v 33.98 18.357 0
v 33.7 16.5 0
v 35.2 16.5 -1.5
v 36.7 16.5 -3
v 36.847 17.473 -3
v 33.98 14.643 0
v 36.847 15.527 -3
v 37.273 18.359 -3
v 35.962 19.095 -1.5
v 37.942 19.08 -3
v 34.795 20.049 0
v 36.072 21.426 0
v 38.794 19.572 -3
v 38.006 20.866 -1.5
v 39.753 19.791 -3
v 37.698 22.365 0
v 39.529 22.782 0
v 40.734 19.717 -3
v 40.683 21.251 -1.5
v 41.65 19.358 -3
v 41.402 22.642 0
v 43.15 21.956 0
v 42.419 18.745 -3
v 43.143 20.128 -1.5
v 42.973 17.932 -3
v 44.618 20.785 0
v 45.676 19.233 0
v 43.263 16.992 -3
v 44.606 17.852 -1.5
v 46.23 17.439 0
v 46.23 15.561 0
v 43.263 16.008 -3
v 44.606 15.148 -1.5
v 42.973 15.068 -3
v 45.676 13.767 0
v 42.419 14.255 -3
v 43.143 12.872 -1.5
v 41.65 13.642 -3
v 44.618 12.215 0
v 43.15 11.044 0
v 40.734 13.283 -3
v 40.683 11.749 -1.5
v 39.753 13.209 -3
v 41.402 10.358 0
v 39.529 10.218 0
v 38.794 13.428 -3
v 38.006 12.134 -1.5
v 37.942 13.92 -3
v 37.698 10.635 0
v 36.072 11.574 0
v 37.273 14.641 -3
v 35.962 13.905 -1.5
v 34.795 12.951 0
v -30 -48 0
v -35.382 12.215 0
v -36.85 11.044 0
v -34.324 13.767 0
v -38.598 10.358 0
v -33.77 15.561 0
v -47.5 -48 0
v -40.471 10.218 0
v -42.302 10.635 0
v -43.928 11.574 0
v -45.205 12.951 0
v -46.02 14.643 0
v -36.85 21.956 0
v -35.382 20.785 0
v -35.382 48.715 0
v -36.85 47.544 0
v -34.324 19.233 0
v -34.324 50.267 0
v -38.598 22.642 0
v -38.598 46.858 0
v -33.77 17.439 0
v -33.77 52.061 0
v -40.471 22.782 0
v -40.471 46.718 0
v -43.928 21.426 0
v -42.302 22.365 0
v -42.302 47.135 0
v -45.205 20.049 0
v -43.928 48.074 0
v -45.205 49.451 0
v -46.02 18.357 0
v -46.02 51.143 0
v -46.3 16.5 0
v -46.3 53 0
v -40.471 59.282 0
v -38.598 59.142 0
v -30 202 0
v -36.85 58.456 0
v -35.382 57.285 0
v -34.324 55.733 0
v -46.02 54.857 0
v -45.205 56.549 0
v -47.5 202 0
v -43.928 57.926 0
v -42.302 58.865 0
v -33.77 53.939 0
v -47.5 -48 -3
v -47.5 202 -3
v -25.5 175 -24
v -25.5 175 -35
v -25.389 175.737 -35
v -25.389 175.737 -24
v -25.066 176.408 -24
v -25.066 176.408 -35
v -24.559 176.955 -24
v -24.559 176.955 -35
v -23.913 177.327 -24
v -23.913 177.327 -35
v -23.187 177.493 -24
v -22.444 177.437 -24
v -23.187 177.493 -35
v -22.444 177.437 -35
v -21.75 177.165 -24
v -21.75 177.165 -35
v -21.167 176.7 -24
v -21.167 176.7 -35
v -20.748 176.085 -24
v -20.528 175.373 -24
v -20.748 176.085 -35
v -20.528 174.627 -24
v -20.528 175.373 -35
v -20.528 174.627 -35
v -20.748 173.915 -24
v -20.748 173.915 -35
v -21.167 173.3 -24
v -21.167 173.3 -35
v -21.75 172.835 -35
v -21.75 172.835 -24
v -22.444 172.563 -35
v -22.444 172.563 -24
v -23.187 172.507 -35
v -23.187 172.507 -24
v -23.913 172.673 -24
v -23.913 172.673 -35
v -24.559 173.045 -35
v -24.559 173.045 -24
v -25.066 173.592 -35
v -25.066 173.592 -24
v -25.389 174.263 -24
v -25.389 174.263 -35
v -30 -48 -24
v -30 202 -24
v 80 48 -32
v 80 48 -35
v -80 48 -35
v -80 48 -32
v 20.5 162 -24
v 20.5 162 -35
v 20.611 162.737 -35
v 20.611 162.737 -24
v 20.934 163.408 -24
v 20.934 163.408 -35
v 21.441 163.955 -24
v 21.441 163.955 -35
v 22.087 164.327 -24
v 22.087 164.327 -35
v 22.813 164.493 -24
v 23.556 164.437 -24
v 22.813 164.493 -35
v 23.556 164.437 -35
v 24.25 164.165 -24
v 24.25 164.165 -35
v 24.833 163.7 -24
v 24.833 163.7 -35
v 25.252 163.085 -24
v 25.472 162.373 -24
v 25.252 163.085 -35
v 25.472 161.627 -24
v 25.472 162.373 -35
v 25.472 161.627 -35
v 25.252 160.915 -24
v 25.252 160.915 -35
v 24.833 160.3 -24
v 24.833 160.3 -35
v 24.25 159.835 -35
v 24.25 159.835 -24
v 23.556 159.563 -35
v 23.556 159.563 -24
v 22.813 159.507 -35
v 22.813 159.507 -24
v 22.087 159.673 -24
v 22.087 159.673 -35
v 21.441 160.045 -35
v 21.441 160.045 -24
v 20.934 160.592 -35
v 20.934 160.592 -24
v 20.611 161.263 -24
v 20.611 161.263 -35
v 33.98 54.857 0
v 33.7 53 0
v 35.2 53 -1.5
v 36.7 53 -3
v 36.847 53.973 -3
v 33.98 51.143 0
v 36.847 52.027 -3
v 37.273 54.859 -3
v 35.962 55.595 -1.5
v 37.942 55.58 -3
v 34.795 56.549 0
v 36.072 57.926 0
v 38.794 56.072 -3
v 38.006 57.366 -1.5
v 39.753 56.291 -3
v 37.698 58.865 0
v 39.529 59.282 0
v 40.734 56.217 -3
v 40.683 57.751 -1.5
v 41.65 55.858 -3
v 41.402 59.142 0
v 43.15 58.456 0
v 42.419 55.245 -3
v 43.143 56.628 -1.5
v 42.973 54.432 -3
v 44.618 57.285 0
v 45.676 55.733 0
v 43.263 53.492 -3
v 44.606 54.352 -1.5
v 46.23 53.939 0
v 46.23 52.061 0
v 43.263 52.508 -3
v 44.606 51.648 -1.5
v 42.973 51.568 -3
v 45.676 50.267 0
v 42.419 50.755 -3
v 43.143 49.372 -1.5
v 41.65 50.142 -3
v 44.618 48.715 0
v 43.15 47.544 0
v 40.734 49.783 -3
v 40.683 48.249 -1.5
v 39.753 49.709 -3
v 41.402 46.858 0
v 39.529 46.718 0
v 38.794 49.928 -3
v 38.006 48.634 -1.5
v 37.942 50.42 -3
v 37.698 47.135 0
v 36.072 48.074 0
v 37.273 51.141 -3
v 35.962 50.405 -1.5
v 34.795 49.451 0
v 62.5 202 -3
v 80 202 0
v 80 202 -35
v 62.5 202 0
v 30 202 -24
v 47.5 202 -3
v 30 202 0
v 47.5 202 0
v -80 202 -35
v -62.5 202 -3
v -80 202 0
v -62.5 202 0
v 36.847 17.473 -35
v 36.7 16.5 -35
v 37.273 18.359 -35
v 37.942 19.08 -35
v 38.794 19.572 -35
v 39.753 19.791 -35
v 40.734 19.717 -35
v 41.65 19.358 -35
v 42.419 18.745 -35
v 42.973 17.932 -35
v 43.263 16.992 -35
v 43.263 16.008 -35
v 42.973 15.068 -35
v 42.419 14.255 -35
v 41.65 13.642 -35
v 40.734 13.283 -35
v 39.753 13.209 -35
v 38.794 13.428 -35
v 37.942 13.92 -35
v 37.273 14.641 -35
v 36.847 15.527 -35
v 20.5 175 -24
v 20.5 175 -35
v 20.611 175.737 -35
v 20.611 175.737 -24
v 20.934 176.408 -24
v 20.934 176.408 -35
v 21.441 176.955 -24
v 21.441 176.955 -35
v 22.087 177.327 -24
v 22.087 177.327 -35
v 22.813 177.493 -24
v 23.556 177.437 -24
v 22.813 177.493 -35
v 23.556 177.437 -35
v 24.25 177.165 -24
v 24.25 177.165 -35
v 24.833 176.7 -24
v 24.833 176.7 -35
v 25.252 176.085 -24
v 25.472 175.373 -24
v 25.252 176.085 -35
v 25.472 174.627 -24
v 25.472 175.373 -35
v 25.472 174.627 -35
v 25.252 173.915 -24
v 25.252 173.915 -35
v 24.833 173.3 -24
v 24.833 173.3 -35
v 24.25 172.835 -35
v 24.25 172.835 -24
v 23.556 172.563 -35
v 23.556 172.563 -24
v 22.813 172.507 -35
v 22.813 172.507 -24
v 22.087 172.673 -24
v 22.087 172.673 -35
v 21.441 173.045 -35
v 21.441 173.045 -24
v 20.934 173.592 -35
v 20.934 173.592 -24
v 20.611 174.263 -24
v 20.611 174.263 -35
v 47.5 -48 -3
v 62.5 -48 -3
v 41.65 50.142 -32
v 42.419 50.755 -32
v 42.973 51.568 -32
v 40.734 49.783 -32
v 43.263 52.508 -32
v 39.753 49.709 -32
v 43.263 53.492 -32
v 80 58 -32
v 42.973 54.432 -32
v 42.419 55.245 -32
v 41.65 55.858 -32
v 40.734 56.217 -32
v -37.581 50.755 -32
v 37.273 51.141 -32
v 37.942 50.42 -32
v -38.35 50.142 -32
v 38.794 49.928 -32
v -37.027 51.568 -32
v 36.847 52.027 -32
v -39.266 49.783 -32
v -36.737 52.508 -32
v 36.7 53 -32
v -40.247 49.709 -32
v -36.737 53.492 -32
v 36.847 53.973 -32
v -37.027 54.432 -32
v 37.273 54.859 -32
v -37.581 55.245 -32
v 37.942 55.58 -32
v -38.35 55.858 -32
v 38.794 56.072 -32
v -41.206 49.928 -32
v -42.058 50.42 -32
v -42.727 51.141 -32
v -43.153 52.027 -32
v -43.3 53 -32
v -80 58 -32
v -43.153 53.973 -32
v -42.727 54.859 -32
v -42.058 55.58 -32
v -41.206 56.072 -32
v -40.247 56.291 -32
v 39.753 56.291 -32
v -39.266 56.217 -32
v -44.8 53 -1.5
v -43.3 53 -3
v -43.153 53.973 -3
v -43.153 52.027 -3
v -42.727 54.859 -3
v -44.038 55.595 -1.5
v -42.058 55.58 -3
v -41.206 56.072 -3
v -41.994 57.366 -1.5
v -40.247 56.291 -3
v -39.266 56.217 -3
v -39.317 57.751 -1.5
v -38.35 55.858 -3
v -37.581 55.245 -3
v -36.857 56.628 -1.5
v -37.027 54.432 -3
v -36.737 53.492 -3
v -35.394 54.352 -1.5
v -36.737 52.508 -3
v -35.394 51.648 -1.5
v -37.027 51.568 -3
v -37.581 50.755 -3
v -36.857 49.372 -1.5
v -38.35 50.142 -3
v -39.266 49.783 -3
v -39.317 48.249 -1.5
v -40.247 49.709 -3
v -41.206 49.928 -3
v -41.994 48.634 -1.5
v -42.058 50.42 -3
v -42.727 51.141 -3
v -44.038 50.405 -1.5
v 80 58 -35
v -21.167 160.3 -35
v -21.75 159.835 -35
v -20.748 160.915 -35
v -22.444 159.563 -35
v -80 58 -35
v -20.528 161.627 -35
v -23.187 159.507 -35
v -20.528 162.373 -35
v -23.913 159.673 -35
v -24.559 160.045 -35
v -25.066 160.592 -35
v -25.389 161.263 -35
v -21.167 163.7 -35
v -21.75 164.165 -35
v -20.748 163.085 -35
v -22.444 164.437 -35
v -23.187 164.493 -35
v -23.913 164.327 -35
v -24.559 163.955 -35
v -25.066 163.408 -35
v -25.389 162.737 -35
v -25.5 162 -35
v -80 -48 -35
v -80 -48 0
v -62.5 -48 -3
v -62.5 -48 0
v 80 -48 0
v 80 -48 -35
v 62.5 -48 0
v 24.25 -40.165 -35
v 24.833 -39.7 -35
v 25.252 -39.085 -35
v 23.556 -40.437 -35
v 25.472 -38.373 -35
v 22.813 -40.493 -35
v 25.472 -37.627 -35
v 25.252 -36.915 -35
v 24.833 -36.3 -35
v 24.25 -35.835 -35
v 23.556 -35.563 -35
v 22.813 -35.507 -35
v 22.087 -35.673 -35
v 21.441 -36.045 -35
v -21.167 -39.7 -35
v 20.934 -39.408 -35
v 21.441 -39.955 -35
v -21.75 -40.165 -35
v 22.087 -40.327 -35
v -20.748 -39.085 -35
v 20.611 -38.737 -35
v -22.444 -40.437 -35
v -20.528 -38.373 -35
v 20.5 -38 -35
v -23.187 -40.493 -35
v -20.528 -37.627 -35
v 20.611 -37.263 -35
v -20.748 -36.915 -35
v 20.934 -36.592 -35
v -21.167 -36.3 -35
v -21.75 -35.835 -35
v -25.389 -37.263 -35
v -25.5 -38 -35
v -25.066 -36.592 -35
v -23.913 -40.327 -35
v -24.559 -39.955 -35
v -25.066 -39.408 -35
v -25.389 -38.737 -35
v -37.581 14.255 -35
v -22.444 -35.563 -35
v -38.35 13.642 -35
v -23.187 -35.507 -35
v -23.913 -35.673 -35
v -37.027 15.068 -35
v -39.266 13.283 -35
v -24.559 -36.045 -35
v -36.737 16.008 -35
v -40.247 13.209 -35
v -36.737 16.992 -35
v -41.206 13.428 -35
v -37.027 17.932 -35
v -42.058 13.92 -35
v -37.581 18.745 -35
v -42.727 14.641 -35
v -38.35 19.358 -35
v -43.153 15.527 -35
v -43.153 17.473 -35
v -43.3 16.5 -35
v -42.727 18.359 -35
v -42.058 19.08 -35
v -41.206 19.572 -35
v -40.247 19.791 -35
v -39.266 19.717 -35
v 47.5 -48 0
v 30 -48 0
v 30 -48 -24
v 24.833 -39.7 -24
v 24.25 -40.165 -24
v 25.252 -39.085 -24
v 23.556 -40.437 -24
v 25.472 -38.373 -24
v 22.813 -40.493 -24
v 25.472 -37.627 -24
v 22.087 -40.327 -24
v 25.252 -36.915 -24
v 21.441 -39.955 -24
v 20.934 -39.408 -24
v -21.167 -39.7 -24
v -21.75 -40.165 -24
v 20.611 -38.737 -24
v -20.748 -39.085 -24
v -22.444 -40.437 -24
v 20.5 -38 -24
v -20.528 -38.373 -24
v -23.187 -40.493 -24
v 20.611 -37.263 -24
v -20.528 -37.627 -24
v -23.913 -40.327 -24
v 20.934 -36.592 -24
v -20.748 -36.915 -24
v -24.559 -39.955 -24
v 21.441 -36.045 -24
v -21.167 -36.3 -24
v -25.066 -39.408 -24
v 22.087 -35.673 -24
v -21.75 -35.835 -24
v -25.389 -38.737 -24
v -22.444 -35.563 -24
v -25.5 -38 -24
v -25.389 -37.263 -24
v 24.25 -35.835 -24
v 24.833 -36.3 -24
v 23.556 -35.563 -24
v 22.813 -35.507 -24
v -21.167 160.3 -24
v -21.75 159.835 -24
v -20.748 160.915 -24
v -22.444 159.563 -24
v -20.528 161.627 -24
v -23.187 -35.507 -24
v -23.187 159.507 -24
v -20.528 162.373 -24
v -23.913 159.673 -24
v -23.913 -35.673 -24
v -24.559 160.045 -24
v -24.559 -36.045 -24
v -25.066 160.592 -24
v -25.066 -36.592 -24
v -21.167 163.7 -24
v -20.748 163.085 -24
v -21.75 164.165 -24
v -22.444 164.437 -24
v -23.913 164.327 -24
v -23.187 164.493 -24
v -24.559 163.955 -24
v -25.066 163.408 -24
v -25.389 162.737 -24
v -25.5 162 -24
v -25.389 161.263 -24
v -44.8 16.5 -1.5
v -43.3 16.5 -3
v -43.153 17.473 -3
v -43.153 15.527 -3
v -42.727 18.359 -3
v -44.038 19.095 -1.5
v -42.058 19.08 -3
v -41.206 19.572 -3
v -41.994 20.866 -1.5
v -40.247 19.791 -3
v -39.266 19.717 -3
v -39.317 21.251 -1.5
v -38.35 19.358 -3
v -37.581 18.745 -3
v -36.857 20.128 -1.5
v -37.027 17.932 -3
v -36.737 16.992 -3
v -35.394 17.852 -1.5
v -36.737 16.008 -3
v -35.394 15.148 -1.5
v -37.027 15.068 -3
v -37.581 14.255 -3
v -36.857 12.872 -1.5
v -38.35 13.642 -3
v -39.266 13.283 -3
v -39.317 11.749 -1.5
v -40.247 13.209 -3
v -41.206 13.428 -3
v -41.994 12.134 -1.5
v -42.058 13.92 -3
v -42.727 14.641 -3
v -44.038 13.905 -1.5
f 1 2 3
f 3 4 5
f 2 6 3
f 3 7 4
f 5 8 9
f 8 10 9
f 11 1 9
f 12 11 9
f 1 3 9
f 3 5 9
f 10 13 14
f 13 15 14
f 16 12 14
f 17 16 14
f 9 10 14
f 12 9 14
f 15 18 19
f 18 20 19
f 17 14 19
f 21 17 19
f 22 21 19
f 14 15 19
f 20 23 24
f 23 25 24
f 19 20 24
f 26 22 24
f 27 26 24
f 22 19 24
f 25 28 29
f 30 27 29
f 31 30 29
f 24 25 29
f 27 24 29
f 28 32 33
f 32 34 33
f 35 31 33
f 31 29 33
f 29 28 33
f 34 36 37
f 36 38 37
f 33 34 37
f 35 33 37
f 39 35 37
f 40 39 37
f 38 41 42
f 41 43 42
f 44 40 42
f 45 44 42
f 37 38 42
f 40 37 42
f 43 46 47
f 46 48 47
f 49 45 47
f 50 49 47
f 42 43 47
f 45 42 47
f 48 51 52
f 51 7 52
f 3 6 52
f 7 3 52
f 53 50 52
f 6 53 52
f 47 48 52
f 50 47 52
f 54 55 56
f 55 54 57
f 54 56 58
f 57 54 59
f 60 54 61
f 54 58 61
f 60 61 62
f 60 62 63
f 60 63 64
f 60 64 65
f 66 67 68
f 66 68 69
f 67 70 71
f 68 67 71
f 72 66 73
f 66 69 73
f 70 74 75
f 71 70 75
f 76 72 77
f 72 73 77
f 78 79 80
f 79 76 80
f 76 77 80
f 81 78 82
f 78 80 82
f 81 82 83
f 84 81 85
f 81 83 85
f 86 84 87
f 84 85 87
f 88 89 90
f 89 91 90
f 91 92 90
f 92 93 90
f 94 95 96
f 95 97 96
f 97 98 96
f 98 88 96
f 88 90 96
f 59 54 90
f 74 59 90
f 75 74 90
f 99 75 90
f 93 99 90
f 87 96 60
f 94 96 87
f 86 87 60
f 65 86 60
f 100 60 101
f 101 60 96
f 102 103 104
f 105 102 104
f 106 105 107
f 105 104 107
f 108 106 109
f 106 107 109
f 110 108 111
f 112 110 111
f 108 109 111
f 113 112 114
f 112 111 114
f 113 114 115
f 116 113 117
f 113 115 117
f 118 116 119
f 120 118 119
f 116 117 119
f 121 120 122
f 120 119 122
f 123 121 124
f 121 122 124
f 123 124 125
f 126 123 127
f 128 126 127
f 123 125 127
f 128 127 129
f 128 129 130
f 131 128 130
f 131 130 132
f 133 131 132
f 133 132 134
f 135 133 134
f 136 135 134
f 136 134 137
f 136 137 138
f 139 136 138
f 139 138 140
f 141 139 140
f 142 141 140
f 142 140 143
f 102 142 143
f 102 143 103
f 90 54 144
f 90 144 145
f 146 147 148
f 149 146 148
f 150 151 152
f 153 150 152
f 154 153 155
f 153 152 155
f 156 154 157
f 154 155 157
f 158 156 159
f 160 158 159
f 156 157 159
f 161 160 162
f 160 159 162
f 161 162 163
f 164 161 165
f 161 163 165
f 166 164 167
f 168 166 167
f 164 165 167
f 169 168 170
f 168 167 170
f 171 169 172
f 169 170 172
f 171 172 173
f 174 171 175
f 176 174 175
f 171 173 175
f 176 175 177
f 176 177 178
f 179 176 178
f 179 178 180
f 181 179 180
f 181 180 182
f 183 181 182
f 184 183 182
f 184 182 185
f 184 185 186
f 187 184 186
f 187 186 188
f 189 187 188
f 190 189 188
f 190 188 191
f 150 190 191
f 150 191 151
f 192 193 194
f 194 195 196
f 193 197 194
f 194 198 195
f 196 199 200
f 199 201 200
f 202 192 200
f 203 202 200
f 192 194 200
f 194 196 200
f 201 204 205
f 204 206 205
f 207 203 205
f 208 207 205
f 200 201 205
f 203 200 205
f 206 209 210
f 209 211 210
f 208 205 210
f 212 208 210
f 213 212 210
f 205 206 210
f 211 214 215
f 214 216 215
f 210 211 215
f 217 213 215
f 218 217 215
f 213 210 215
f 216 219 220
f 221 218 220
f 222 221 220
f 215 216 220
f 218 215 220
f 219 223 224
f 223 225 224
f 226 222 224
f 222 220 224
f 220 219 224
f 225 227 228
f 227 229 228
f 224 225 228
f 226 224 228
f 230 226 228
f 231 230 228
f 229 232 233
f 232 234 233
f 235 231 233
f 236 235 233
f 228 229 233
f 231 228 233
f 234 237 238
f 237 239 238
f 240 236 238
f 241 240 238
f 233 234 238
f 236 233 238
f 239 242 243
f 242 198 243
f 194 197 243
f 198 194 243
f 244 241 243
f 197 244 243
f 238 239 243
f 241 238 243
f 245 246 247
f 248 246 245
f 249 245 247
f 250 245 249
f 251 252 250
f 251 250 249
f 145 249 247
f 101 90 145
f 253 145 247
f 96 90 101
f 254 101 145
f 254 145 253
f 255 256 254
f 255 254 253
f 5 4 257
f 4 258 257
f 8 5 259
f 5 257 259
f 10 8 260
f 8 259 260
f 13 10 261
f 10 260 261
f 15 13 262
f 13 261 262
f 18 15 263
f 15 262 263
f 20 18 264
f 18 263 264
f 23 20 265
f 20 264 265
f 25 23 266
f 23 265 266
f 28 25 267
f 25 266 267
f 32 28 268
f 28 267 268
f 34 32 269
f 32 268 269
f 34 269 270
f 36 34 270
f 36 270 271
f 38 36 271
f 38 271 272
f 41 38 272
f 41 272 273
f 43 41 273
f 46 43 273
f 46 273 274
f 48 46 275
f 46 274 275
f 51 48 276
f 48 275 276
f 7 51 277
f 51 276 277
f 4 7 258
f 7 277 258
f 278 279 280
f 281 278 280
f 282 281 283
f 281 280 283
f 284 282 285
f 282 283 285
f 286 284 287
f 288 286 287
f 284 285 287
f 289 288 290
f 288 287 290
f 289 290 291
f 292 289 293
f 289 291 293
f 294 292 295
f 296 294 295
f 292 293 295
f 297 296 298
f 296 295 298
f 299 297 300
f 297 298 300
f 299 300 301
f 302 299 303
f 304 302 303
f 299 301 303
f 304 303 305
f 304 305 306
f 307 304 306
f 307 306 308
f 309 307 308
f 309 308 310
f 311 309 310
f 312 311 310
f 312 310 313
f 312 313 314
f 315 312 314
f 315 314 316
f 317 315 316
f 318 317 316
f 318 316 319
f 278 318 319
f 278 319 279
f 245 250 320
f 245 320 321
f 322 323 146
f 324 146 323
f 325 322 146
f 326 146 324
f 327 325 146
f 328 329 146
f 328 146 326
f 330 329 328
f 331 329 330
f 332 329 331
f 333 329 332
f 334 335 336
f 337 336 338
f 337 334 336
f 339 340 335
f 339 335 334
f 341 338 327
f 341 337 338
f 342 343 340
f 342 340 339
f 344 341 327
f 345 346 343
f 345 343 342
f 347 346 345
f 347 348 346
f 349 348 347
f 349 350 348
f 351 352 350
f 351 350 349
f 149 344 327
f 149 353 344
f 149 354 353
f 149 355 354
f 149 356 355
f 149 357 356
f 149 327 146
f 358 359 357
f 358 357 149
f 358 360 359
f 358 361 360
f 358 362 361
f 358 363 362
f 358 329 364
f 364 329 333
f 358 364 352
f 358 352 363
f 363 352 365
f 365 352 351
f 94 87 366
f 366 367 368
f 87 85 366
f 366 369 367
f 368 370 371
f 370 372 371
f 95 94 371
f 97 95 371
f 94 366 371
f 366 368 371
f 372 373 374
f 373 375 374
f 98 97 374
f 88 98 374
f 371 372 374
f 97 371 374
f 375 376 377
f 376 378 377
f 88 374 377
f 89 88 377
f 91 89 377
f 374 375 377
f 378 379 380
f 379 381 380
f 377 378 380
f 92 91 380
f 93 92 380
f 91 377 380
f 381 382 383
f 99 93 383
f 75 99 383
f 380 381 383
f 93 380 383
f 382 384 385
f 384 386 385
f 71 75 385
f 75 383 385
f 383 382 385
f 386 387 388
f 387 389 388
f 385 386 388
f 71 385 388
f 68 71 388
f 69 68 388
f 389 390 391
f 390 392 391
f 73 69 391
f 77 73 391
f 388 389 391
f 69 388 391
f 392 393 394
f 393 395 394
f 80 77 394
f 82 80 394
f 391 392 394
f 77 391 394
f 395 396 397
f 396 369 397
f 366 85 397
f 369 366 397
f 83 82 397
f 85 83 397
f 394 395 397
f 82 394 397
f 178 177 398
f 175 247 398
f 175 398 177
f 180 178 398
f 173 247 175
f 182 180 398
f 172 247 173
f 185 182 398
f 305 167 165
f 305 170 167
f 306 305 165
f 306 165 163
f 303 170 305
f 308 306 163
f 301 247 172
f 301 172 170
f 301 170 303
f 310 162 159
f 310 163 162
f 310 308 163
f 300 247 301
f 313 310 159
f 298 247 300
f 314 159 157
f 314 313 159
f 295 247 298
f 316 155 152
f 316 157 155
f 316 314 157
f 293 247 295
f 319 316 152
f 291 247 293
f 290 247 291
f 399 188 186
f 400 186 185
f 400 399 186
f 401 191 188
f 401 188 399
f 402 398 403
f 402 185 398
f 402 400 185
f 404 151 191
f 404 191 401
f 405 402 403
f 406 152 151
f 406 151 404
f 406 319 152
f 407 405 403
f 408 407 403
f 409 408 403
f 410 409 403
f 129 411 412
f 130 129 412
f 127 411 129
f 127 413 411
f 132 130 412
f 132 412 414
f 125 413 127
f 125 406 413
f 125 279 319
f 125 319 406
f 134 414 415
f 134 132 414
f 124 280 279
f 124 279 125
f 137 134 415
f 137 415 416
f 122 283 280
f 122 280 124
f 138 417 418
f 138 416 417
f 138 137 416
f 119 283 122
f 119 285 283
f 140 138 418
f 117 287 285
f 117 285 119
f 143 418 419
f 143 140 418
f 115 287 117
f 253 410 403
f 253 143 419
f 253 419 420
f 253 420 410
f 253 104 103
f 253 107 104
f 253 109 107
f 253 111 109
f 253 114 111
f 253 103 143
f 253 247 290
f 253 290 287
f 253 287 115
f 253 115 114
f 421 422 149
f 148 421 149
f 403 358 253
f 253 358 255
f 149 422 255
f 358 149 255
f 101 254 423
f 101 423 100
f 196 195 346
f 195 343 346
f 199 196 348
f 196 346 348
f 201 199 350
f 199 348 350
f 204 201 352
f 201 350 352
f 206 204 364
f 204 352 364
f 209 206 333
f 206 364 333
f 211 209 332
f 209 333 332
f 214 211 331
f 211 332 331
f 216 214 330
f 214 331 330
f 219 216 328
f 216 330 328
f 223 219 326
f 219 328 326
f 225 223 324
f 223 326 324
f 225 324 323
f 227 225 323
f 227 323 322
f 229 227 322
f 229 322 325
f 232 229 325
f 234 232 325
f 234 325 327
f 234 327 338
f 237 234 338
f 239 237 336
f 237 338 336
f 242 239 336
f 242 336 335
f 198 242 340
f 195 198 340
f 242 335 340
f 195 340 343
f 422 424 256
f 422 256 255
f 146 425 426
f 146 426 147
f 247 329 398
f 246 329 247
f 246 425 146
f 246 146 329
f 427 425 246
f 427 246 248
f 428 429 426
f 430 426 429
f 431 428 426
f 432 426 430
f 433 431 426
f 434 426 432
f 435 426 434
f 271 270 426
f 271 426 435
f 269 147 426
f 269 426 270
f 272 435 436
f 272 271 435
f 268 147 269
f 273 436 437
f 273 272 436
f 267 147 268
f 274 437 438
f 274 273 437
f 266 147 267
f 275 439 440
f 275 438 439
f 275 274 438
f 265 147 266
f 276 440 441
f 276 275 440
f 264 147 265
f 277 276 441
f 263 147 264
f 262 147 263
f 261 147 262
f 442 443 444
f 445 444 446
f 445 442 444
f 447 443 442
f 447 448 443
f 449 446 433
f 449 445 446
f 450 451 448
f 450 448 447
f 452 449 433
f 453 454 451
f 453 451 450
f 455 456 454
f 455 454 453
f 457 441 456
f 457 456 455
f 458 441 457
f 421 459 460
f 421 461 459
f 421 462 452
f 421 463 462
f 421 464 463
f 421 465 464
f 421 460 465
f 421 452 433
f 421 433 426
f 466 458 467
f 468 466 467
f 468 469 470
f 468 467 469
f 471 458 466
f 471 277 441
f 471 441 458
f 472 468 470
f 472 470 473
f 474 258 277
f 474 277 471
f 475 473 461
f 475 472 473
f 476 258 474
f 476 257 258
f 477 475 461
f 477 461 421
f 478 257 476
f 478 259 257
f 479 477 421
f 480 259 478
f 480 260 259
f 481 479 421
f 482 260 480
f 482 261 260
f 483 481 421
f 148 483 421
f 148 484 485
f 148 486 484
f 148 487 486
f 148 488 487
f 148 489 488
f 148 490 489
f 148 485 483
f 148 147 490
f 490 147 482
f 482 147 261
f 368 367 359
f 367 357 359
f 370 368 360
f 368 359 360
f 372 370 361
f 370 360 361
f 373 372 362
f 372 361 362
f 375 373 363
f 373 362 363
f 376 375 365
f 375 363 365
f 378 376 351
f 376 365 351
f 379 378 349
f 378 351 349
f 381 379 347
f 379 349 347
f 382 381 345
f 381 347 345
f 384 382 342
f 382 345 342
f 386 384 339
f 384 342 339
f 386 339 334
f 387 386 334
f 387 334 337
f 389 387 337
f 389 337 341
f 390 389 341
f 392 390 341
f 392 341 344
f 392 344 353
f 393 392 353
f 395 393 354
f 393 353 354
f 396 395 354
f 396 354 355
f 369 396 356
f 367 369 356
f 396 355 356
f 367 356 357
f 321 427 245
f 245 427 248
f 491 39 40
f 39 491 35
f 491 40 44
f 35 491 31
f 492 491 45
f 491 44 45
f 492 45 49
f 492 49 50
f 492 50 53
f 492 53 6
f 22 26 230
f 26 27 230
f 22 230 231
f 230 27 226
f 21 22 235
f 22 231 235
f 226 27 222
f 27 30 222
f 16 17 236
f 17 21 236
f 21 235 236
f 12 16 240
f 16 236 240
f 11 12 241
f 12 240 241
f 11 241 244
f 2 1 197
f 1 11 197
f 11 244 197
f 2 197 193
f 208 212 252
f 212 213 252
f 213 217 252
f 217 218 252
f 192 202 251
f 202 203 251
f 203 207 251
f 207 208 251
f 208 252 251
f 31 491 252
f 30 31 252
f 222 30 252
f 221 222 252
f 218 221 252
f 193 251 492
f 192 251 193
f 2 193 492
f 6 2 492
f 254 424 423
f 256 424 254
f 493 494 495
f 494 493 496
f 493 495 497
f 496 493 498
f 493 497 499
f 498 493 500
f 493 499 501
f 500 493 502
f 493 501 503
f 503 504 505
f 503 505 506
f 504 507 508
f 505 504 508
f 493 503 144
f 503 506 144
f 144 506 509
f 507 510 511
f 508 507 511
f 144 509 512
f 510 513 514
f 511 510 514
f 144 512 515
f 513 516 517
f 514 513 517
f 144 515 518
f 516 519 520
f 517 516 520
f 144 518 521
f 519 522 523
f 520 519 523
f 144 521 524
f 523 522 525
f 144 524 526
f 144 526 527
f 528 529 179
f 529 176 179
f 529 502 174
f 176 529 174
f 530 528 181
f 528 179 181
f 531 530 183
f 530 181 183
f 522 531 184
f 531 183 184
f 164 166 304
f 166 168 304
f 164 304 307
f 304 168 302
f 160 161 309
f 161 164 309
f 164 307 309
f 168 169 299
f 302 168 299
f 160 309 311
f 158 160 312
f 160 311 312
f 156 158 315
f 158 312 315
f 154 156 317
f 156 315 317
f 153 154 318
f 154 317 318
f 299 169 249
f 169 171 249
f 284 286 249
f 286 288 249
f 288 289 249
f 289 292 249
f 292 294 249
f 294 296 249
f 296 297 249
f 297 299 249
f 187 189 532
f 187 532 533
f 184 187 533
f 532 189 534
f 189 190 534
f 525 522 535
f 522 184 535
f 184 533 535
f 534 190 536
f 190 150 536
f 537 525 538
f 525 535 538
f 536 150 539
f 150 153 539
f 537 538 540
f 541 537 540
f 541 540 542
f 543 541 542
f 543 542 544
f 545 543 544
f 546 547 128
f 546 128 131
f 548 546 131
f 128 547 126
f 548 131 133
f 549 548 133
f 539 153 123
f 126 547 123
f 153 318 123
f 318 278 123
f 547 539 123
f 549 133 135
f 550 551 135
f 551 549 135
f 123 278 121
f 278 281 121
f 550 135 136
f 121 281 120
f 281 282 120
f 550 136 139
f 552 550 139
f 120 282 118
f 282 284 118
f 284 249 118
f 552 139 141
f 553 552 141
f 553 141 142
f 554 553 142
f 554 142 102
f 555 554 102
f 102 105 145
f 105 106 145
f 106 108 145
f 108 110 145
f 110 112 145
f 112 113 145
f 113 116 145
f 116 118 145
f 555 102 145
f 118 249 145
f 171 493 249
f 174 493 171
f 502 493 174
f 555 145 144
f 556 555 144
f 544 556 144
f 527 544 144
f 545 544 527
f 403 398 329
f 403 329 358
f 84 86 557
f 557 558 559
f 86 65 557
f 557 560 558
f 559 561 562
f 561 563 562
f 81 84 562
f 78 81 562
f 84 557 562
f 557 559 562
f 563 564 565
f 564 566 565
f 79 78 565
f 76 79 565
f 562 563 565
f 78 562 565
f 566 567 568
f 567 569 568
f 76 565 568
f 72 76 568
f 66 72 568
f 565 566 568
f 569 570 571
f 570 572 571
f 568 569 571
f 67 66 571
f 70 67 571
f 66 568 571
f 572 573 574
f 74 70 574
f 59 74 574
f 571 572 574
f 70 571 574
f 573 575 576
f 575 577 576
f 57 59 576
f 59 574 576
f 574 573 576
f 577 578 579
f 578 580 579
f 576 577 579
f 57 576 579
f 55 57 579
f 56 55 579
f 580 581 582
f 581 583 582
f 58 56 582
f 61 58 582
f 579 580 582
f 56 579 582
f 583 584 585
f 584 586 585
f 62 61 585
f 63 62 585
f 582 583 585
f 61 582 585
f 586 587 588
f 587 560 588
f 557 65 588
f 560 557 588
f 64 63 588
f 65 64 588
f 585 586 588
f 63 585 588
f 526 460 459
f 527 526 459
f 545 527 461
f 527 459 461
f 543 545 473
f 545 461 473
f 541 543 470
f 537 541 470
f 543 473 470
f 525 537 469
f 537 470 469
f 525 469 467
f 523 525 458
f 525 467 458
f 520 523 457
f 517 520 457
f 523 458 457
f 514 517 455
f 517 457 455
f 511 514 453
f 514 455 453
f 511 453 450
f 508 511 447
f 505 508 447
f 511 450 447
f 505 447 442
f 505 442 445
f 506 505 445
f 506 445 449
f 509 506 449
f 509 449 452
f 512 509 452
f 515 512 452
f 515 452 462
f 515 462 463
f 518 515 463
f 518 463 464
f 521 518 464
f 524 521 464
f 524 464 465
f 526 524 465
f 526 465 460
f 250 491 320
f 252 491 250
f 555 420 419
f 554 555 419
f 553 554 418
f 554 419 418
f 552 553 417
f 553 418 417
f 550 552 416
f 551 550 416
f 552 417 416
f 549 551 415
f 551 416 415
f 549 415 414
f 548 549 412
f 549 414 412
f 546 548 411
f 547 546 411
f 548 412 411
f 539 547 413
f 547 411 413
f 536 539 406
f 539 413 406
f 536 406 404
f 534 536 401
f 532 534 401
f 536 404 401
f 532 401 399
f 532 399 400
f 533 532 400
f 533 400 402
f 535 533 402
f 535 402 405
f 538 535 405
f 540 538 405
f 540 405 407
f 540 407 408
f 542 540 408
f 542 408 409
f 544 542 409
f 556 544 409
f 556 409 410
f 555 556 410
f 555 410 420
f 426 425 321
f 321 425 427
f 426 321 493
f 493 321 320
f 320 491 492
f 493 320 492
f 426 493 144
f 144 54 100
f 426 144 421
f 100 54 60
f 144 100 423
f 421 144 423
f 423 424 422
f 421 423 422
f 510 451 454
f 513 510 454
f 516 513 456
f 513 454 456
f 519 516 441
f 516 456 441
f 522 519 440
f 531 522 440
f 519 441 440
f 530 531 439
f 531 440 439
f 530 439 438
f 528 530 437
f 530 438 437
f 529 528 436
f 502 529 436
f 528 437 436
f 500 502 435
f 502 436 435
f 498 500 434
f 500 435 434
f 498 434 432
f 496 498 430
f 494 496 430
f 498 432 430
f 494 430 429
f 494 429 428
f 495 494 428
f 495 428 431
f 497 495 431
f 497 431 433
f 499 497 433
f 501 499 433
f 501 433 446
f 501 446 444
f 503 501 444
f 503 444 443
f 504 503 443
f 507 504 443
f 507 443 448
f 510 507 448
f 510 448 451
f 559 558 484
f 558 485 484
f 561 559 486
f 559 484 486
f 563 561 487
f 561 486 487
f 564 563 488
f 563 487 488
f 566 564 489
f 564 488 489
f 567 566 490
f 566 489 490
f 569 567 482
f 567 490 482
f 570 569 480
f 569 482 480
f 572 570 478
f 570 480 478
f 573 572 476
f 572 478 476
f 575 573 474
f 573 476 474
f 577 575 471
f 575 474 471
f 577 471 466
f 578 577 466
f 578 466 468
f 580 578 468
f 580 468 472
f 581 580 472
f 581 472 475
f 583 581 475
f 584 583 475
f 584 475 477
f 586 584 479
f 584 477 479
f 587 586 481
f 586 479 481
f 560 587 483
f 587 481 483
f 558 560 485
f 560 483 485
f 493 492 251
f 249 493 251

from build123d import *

# Parameters (mm, degrees)
SKETCH_9_W                 = 160
SKETCH_9_H                 = 250
EXTRUDE_499_DEPTH          = 35
SKETCH_14_W                = 160
SKETCH_14_H                = 10
CUT_EXTRUDE_746_DEPTH      = 3
HOLE_WIZARD_M6_D           = 6.6
HOLE_WIZARD_M6_CSINK_D     = 12.6
HOLE_WIZARD_M6_CSINK_ANGLE = 90
SKETCH_11_W                = 60
SKETCH_11_H                = 250
CUT_EXTRUDE_2132_DEPTH     = 24
SKETCH_15_W                = 15
SKETCH_15_H                = 300
CUT_EXTRUDE_2595_DEPTH     = 3
HOLE_WIZARD_M6_2_D         = 5
HOLE_WIZARD_3653_D         = 5


with BuildPart() as part:
    # Эскиз9 → Extrude 499 (new body)
    with BuildSketch(Plane(origin=(-20, 0, 0), x_dir=(-1, 0, 0), z_dir=(0, 0, -1))):
        with Locations((-20, 77)):
            Rectangle(SKETCH_9_W, SKETCH_9_H)
    extrude(amount=EXTRUDE_499_DEPTH)

    # Эскиз14 → Cut-Extrude 746 (cut)
    with BuildSketch(Plane(origin=(0, 0, -35), x_dir=(-1, 0, 0), z_dir=(0, 0, -1))):
        with Locations((0, 53)):
            Rectangle(SKETCH_14_W, SKETCH_14_H)
    extrude(amount=-CUT_EXTRUDE_746_DEPTH, mode=Mode.SUBTRACT)

    # Hole Wizard M6 (through all)
    with Locations(Plane.XY):
        with Locations((-40, 53), (40, 53), (-40, 16.5), (40, 16.5)):
            CounterSinkHole(HOLE_WIZARD_M6_D / 2, HOLE_WIZARD_M6_CSINK_D / 2, counter_sink_angle=HOLE_WIZARD_M6_CSINK_ANGLE)

    # Эскиз11 → Cut-Extrude 2132 (cut)
    with BuildSketch(Plane(origin=(0, 0, 0), x_dir=(-1, 0, 0), z_dir=(0, 0, -1))):
        with Locations((0, 77)):
            Rectangle(SKETCH_11_W, SKETCH_11_H)
    extrude(amount=CUT_EXTRUDE_2132_DEPTH, mode=Mode.SUBTRACT)

    # Эскиз15 → Cut-Extrude 2595 (cut)
    with BuildSketch(Plane.XY):
        with Locations((-55, 102)):
            Rectangle(SKETCH_15_W, SKETCH_15_H)
        with Locations((55, 102)):
            Rectangle(SKETCH_15_W, SKETCH_15_H)
    extrude(amount=-CUT_EXTRUDE_2595_DEPTH, mode=Mode.SUBTRACT)

    # Hole Wizard M6 2 (through all)
    with Locations(Plane.XY.offset(-24)):
        with Locations((-23, -38), (23, -38)):
            Hole(HOLE_WIZARD_M6_2_D / 2)

    # Hole Wizard 3653 (through all)
    with Locations(Plane.XY.offset(-24)):
        with Locations((-23, 162), (23, 162), (-23, 175), (23, 175)):
            Hole(HOLE_WIZARD_3653_D / 2)


solid = part.part
